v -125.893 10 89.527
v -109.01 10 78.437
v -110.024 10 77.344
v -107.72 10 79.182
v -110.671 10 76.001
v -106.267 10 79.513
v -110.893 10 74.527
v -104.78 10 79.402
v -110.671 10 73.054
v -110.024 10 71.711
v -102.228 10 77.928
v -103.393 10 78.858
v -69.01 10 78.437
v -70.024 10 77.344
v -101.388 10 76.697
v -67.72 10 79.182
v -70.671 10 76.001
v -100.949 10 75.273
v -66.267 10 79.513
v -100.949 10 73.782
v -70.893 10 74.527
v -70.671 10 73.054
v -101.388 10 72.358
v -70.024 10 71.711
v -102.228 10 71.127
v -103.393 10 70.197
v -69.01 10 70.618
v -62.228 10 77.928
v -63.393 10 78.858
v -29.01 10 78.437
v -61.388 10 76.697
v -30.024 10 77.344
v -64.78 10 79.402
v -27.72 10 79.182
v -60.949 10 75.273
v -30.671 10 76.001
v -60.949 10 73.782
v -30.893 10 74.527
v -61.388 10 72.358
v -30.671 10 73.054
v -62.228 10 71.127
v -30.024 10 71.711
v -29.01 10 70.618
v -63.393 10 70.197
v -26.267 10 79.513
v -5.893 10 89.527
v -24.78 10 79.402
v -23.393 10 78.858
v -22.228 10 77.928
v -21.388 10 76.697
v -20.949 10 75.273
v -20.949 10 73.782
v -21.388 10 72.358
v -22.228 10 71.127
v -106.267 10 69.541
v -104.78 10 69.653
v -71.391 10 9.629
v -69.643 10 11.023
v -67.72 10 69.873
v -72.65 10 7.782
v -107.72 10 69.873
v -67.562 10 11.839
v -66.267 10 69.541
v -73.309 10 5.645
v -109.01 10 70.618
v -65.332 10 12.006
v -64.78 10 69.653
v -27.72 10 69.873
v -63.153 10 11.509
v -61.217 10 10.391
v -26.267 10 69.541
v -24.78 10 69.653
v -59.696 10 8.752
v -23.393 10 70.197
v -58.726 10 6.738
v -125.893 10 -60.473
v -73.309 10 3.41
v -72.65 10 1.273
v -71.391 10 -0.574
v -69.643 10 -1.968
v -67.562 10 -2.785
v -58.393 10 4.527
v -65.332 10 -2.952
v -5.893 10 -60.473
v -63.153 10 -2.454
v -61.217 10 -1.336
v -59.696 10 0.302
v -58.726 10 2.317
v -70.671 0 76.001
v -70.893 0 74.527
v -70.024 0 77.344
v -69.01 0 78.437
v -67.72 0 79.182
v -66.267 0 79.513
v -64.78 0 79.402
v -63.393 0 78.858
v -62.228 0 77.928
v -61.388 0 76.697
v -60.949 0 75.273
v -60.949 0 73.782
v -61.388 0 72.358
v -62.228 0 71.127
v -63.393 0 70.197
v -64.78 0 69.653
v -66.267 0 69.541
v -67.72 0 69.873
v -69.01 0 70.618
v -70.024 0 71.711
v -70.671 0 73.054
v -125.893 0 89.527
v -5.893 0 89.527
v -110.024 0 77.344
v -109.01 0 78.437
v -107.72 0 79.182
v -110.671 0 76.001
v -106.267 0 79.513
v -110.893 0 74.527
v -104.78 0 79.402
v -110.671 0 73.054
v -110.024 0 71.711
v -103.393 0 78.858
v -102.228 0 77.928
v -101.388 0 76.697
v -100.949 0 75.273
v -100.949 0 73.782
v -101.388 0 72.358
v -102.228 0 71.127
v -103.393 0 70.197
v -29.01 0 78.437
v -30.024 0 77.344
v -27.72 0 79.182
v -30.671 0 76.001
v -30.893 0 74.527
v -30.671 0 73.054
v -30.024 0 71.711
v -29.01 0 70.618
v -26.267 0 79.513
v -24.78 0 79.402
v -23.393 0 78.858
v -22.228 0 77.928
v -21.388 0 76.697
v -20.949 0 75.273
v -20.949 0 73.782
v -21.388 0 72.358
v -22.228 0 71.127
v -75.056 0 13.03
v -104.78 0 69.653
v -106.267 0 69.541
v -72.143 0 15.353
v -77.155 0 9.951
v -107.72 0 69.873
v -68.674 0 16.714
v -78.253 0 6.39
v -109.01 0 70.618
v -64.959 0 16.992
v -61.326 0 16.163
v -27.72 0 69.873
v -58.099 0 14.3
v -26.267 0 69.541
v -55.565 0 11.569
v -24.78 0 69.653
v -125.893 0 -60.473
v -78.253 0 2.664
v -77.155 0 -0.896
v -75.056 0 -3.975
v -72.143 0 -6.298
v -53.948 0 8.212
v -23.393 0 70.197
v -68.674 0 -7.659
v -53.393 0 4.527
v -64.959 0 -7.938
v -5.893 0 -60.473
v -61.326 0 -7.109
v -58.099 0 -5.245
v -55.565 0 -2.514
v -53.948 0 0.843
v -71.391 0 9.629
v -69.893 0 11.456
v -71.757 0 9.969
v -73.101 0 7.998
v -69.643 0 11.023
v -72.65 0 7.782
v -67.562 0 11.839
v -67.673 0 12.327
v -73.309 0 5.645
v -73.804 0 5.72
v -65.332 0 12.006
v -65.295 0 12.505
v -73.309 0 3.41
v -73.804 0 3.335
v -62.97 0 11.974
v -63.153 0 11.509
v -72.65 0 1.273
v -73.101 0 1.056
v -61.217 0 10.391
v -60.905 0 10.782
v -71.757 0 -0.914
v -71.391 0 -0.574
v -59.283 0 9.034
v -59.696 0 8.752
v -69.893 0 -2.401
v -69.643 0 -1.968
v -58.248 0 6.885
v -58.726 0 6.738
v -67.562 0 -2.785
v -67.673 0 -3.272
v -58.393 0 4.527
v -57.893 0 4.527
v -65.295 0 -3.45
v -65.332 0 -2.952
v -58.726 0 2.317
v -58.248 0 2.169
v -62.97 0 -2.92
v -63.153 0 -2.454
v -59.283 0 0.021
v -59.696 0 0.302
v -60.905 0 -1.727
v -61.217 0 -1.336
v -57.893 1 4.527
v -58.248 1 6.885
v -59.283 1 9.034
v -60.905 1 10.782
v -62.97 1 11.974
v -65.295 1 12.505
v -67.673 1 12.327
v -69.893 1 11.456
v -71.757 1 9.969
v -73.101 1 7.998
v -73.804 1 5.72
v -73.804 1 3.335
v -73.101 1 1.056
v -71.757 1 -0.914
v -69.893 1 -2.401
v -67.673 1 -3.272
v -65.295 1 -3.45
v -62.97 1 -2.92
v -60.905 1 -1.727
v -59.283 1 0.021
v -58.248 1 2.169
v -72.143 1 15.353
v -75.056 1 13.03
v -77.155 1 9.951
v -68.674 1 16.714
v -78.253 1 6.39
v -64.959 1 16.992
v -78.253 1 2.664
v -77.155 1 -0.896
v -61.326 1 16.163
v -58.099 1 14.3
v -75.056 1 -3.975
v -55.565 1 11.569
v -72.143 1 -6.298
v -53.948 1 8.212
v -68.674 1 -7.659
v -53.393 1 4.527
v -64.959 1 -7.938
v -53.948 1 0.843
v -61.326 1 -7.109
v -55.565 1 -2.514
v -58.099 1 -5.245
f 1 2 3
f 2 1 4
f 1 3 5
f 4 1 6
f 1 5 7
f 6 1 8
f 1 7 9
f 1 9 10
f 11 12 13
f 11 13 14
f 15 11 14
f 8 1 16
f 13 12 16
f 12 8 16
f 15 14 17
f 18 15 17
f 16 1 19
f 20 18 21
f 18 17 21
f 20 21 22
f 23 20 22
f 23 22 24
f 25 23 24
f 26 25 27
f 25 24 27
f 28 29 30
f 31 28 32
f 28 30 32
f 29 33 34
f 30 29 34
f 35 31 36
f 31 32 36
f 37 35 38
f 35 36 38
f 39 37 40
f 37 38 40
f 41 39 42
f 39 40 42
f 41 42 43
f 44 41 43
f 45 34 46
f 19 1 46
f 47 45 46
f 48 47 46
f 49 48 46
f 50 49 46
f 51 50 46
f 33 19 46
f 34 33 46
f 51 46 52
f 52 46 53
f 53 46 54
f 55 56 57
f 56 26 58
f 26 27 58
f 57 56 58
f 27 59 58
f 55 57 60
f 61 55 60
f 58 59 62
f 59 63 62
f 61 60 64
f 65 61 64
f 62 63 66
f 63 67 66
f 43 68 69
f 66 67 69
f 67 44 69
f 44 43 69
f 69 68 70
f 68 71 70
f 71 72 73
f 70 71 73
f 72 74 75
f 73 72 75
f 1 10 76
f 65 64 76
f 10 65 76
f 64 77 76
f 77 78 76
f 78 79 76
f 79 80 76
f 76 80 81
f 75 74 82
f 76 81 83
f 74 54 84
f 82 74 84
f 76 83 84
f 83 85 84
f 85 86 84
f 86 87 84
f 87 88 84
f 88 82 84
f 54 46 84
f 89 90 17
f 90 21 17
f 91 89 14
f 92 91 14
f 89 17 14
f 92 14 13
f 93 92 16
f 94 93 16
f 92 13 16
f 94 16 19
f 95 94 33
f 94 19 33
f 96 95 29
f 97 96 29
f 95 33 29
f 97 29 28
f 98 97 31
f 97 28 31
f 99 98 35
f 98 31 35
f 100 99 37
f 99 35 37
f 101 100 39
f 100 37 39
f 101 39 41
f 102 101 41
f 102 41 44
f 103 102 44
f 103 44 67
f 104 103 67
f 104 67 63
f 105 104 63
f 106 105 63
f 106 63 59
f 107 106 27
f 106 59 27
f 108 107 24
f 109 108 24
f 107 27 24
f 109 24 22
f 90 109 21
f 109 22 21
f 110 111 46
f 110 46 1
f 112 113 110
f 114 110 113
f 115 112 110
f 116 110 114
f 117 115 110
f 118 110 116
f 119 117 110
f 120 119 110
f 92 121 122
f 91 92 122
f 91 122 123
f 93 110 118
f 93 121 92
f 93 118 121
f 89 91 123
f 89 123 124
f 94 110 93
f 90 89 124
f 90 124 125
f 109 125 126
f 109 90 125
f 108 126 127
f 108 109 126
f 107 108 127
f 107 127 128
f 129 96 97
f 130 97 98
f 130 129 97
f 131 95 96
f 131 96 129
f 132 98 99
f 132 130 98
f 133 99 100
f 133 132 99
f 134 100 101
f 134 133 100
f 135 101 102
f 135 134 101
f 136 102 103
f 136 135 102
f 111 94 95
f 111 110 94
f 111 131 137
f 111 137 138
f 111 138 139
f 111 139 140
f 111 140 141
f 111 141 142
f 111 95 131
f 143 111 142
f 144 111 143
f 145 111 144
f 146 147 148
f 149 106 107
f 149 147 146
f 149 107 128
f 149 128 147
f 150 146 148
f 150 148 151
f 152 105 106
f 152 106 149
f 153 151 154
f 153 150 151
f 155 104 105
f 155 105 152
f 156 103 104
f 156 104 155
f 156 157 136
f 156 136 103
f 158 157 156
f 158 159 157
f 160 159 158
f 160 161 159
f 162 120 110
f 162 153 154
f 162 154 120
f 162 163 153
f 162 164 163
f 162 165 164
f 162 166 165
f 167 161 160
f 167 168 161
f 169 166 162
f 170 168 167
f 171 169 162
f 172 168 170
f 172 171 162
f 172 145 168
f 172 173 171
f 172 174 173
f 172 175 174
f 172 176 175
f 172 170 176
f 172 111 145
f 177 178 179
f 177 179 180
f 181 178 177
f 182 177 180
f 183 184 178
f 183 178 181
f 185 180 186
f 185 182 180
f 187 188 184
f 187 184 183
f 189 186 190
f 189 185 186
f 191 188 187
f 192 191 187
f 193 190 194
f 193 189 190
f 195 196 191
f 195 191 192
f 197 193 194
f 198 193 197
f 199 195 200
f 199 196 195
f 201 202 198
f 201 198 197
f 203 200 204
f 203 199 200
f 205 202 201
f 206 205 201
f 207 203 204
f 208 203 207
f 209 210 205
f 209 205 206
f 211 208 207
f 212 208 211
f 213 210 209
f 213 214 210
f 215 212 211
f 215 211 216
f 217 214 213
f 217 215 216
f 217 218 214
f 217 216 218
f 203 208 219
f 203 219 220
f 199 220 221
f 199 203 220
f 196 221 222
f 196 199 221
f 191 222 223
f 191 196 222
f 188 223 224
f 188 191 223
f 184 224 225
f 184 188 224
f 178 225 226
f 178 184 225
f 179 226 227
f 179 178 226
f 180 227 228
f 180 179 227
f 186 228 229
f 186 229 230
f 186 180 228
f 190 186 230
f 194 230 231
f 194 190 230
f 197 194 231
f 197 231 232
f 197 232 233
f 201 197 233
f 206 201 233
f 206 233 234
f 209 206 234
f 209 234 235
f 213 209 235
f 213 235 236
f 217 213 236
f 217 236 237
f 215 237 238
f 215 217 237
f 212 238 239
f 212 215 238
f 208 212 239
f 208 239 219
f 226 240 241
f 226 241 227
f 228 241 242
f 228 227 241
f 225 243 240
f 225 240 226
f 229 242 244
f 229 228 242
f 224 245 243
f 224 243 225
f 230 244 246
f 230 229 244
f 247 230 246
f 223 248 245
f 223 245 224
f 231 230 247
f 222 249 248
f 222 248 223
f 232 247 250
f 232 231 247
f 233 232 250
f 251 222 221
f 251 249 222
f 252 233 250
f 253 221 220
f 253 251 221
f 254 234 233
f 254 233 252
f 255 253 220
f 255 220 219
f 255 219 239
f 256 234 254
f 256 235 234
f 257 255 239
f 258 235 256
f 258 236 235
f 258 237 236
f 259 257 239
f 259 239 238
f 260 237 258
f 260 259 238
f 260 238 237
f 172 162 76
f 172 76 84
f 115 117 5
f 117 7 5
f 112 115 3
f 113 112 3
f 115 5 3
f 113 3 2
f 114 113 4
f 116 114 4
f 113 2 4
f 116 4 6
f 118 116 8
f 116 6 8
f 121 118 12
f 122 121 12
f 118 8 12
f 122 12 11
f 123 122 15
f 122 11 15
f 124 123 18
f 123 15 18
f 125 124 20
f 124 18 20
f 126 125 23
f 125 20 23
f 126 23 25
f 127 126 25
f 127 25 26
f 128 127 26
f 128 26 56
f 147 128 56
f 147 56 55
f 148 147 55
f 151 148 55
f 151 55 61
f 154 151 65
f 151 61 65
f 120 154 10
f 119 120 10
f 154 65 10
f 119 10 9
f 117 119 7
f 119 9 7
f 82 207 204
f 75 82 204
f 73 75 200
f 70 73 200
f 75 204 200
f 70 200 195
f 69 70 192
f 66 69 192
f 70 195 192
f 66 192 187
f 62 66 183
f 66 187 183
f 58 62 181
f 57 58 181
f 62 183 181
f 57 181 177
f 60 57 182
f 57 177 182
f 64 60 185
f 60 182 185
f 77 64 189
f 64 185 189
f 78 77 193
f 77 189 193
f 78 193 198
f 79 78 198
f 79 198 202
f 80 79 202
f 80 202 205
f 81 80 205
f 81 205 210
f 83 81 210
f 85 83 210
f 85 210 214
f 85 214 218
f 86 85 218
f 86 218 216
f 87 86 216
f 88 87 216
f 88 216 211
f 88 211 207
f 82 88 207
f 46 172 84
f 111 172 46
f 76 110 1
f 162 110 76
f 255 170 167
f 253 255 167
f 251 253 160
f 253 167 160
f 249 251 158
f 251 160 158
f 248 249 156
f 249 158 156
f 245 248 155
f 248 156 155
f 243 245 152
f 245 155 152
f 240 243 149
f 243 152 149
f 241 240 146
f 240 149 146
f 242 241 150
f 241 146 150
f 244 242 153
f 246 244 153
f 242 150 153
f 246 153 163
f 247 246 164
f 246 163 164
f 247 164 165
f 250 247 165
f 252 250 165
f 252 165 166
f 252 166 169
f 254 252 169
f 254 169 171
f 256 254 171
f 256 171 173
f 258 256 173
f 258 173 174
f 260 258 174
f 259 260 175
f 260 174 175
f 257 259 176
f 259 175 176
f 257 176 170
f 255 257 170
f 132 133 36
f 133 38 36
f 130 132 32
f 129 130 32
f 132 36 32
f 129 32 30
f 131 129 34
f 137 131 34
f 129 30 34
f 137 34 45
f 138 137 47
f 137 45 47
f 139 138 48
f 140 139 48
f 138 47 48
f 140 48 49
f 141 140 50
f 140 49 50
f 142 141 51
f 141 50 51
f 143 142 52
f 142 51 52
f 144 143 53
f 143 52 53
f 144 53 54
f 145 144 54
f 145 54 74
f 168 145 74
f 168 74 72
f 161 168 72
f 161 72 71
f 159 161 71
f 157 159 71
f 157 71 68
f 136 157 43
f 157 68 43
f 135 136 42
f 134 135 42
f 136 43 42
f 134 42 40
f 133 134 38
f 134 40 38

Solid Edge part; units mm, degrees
sketch "Sketch1" plane through (0, 0, 0) normal (0, -1, 0) x (1, 0, 0)
  line L0 (-125.8929, -60.4726) -> (-5.8929, -60.4726)
  line L1 (-5.8929, -60.4726) -> (-5.8929, 89.5274)
  line L2 (-5.8929, 89.5274) -> (-125.8929, 89.5274)
  line L3 (-125.8929, 89.5274) -> (-125.8929, -60.4726)
  dimension "D1" = 120
  dimension "D2" = 150
extrude "Protrusion1" add sketch "Sketch1" against normal blind 10
sketch "Sketch2" plane through (-70.8929, 0, 14.5274) normal (0, -1, 0) x (1, 0, 0)
  circle A0 centre (5, -10) radius 8
  circle A1 centre (5, -10) radius 12.5
  dimension "D1" = 16
  dimension "D2" = 25
  dimension "D3" = 60
  dimension "D4" = 65
  dimension "D5" = 120
extrude "ExtrudedCutout_1" cut sketch "Sketch2" against normal blind 1
sketch "Sketch3" plane through (-70.8929, 0, 4.5274) normal (0, -1, 0) x (1, 0, 0)
  circle A0 centre (5, 0) radius 7.5
  dimension "D1" = 15
extrude "Cutout1" cut sketch "Sketch3" against normal through all
sketch "Sketch4" plane through (-70.8929, 10, 14.5274) normal (0, 1, 0) x (-1, 0, 0)
  circle A0 centre (-5, 60) radius 5
  circle A1 centre (35, 60) radius 5
  circle A2 centre (-45, 60) radius 5
  dimension "D1" = 40
  dimension "D2" = 40
  dimension "D3" = 10
  dimension "D4" = 10
  dimension "D5" = 10
  dimension "D6" = 20
  dimension "D7" = 15
extrude "Cutout2" cut sketch "Sketch4" against normal through all
